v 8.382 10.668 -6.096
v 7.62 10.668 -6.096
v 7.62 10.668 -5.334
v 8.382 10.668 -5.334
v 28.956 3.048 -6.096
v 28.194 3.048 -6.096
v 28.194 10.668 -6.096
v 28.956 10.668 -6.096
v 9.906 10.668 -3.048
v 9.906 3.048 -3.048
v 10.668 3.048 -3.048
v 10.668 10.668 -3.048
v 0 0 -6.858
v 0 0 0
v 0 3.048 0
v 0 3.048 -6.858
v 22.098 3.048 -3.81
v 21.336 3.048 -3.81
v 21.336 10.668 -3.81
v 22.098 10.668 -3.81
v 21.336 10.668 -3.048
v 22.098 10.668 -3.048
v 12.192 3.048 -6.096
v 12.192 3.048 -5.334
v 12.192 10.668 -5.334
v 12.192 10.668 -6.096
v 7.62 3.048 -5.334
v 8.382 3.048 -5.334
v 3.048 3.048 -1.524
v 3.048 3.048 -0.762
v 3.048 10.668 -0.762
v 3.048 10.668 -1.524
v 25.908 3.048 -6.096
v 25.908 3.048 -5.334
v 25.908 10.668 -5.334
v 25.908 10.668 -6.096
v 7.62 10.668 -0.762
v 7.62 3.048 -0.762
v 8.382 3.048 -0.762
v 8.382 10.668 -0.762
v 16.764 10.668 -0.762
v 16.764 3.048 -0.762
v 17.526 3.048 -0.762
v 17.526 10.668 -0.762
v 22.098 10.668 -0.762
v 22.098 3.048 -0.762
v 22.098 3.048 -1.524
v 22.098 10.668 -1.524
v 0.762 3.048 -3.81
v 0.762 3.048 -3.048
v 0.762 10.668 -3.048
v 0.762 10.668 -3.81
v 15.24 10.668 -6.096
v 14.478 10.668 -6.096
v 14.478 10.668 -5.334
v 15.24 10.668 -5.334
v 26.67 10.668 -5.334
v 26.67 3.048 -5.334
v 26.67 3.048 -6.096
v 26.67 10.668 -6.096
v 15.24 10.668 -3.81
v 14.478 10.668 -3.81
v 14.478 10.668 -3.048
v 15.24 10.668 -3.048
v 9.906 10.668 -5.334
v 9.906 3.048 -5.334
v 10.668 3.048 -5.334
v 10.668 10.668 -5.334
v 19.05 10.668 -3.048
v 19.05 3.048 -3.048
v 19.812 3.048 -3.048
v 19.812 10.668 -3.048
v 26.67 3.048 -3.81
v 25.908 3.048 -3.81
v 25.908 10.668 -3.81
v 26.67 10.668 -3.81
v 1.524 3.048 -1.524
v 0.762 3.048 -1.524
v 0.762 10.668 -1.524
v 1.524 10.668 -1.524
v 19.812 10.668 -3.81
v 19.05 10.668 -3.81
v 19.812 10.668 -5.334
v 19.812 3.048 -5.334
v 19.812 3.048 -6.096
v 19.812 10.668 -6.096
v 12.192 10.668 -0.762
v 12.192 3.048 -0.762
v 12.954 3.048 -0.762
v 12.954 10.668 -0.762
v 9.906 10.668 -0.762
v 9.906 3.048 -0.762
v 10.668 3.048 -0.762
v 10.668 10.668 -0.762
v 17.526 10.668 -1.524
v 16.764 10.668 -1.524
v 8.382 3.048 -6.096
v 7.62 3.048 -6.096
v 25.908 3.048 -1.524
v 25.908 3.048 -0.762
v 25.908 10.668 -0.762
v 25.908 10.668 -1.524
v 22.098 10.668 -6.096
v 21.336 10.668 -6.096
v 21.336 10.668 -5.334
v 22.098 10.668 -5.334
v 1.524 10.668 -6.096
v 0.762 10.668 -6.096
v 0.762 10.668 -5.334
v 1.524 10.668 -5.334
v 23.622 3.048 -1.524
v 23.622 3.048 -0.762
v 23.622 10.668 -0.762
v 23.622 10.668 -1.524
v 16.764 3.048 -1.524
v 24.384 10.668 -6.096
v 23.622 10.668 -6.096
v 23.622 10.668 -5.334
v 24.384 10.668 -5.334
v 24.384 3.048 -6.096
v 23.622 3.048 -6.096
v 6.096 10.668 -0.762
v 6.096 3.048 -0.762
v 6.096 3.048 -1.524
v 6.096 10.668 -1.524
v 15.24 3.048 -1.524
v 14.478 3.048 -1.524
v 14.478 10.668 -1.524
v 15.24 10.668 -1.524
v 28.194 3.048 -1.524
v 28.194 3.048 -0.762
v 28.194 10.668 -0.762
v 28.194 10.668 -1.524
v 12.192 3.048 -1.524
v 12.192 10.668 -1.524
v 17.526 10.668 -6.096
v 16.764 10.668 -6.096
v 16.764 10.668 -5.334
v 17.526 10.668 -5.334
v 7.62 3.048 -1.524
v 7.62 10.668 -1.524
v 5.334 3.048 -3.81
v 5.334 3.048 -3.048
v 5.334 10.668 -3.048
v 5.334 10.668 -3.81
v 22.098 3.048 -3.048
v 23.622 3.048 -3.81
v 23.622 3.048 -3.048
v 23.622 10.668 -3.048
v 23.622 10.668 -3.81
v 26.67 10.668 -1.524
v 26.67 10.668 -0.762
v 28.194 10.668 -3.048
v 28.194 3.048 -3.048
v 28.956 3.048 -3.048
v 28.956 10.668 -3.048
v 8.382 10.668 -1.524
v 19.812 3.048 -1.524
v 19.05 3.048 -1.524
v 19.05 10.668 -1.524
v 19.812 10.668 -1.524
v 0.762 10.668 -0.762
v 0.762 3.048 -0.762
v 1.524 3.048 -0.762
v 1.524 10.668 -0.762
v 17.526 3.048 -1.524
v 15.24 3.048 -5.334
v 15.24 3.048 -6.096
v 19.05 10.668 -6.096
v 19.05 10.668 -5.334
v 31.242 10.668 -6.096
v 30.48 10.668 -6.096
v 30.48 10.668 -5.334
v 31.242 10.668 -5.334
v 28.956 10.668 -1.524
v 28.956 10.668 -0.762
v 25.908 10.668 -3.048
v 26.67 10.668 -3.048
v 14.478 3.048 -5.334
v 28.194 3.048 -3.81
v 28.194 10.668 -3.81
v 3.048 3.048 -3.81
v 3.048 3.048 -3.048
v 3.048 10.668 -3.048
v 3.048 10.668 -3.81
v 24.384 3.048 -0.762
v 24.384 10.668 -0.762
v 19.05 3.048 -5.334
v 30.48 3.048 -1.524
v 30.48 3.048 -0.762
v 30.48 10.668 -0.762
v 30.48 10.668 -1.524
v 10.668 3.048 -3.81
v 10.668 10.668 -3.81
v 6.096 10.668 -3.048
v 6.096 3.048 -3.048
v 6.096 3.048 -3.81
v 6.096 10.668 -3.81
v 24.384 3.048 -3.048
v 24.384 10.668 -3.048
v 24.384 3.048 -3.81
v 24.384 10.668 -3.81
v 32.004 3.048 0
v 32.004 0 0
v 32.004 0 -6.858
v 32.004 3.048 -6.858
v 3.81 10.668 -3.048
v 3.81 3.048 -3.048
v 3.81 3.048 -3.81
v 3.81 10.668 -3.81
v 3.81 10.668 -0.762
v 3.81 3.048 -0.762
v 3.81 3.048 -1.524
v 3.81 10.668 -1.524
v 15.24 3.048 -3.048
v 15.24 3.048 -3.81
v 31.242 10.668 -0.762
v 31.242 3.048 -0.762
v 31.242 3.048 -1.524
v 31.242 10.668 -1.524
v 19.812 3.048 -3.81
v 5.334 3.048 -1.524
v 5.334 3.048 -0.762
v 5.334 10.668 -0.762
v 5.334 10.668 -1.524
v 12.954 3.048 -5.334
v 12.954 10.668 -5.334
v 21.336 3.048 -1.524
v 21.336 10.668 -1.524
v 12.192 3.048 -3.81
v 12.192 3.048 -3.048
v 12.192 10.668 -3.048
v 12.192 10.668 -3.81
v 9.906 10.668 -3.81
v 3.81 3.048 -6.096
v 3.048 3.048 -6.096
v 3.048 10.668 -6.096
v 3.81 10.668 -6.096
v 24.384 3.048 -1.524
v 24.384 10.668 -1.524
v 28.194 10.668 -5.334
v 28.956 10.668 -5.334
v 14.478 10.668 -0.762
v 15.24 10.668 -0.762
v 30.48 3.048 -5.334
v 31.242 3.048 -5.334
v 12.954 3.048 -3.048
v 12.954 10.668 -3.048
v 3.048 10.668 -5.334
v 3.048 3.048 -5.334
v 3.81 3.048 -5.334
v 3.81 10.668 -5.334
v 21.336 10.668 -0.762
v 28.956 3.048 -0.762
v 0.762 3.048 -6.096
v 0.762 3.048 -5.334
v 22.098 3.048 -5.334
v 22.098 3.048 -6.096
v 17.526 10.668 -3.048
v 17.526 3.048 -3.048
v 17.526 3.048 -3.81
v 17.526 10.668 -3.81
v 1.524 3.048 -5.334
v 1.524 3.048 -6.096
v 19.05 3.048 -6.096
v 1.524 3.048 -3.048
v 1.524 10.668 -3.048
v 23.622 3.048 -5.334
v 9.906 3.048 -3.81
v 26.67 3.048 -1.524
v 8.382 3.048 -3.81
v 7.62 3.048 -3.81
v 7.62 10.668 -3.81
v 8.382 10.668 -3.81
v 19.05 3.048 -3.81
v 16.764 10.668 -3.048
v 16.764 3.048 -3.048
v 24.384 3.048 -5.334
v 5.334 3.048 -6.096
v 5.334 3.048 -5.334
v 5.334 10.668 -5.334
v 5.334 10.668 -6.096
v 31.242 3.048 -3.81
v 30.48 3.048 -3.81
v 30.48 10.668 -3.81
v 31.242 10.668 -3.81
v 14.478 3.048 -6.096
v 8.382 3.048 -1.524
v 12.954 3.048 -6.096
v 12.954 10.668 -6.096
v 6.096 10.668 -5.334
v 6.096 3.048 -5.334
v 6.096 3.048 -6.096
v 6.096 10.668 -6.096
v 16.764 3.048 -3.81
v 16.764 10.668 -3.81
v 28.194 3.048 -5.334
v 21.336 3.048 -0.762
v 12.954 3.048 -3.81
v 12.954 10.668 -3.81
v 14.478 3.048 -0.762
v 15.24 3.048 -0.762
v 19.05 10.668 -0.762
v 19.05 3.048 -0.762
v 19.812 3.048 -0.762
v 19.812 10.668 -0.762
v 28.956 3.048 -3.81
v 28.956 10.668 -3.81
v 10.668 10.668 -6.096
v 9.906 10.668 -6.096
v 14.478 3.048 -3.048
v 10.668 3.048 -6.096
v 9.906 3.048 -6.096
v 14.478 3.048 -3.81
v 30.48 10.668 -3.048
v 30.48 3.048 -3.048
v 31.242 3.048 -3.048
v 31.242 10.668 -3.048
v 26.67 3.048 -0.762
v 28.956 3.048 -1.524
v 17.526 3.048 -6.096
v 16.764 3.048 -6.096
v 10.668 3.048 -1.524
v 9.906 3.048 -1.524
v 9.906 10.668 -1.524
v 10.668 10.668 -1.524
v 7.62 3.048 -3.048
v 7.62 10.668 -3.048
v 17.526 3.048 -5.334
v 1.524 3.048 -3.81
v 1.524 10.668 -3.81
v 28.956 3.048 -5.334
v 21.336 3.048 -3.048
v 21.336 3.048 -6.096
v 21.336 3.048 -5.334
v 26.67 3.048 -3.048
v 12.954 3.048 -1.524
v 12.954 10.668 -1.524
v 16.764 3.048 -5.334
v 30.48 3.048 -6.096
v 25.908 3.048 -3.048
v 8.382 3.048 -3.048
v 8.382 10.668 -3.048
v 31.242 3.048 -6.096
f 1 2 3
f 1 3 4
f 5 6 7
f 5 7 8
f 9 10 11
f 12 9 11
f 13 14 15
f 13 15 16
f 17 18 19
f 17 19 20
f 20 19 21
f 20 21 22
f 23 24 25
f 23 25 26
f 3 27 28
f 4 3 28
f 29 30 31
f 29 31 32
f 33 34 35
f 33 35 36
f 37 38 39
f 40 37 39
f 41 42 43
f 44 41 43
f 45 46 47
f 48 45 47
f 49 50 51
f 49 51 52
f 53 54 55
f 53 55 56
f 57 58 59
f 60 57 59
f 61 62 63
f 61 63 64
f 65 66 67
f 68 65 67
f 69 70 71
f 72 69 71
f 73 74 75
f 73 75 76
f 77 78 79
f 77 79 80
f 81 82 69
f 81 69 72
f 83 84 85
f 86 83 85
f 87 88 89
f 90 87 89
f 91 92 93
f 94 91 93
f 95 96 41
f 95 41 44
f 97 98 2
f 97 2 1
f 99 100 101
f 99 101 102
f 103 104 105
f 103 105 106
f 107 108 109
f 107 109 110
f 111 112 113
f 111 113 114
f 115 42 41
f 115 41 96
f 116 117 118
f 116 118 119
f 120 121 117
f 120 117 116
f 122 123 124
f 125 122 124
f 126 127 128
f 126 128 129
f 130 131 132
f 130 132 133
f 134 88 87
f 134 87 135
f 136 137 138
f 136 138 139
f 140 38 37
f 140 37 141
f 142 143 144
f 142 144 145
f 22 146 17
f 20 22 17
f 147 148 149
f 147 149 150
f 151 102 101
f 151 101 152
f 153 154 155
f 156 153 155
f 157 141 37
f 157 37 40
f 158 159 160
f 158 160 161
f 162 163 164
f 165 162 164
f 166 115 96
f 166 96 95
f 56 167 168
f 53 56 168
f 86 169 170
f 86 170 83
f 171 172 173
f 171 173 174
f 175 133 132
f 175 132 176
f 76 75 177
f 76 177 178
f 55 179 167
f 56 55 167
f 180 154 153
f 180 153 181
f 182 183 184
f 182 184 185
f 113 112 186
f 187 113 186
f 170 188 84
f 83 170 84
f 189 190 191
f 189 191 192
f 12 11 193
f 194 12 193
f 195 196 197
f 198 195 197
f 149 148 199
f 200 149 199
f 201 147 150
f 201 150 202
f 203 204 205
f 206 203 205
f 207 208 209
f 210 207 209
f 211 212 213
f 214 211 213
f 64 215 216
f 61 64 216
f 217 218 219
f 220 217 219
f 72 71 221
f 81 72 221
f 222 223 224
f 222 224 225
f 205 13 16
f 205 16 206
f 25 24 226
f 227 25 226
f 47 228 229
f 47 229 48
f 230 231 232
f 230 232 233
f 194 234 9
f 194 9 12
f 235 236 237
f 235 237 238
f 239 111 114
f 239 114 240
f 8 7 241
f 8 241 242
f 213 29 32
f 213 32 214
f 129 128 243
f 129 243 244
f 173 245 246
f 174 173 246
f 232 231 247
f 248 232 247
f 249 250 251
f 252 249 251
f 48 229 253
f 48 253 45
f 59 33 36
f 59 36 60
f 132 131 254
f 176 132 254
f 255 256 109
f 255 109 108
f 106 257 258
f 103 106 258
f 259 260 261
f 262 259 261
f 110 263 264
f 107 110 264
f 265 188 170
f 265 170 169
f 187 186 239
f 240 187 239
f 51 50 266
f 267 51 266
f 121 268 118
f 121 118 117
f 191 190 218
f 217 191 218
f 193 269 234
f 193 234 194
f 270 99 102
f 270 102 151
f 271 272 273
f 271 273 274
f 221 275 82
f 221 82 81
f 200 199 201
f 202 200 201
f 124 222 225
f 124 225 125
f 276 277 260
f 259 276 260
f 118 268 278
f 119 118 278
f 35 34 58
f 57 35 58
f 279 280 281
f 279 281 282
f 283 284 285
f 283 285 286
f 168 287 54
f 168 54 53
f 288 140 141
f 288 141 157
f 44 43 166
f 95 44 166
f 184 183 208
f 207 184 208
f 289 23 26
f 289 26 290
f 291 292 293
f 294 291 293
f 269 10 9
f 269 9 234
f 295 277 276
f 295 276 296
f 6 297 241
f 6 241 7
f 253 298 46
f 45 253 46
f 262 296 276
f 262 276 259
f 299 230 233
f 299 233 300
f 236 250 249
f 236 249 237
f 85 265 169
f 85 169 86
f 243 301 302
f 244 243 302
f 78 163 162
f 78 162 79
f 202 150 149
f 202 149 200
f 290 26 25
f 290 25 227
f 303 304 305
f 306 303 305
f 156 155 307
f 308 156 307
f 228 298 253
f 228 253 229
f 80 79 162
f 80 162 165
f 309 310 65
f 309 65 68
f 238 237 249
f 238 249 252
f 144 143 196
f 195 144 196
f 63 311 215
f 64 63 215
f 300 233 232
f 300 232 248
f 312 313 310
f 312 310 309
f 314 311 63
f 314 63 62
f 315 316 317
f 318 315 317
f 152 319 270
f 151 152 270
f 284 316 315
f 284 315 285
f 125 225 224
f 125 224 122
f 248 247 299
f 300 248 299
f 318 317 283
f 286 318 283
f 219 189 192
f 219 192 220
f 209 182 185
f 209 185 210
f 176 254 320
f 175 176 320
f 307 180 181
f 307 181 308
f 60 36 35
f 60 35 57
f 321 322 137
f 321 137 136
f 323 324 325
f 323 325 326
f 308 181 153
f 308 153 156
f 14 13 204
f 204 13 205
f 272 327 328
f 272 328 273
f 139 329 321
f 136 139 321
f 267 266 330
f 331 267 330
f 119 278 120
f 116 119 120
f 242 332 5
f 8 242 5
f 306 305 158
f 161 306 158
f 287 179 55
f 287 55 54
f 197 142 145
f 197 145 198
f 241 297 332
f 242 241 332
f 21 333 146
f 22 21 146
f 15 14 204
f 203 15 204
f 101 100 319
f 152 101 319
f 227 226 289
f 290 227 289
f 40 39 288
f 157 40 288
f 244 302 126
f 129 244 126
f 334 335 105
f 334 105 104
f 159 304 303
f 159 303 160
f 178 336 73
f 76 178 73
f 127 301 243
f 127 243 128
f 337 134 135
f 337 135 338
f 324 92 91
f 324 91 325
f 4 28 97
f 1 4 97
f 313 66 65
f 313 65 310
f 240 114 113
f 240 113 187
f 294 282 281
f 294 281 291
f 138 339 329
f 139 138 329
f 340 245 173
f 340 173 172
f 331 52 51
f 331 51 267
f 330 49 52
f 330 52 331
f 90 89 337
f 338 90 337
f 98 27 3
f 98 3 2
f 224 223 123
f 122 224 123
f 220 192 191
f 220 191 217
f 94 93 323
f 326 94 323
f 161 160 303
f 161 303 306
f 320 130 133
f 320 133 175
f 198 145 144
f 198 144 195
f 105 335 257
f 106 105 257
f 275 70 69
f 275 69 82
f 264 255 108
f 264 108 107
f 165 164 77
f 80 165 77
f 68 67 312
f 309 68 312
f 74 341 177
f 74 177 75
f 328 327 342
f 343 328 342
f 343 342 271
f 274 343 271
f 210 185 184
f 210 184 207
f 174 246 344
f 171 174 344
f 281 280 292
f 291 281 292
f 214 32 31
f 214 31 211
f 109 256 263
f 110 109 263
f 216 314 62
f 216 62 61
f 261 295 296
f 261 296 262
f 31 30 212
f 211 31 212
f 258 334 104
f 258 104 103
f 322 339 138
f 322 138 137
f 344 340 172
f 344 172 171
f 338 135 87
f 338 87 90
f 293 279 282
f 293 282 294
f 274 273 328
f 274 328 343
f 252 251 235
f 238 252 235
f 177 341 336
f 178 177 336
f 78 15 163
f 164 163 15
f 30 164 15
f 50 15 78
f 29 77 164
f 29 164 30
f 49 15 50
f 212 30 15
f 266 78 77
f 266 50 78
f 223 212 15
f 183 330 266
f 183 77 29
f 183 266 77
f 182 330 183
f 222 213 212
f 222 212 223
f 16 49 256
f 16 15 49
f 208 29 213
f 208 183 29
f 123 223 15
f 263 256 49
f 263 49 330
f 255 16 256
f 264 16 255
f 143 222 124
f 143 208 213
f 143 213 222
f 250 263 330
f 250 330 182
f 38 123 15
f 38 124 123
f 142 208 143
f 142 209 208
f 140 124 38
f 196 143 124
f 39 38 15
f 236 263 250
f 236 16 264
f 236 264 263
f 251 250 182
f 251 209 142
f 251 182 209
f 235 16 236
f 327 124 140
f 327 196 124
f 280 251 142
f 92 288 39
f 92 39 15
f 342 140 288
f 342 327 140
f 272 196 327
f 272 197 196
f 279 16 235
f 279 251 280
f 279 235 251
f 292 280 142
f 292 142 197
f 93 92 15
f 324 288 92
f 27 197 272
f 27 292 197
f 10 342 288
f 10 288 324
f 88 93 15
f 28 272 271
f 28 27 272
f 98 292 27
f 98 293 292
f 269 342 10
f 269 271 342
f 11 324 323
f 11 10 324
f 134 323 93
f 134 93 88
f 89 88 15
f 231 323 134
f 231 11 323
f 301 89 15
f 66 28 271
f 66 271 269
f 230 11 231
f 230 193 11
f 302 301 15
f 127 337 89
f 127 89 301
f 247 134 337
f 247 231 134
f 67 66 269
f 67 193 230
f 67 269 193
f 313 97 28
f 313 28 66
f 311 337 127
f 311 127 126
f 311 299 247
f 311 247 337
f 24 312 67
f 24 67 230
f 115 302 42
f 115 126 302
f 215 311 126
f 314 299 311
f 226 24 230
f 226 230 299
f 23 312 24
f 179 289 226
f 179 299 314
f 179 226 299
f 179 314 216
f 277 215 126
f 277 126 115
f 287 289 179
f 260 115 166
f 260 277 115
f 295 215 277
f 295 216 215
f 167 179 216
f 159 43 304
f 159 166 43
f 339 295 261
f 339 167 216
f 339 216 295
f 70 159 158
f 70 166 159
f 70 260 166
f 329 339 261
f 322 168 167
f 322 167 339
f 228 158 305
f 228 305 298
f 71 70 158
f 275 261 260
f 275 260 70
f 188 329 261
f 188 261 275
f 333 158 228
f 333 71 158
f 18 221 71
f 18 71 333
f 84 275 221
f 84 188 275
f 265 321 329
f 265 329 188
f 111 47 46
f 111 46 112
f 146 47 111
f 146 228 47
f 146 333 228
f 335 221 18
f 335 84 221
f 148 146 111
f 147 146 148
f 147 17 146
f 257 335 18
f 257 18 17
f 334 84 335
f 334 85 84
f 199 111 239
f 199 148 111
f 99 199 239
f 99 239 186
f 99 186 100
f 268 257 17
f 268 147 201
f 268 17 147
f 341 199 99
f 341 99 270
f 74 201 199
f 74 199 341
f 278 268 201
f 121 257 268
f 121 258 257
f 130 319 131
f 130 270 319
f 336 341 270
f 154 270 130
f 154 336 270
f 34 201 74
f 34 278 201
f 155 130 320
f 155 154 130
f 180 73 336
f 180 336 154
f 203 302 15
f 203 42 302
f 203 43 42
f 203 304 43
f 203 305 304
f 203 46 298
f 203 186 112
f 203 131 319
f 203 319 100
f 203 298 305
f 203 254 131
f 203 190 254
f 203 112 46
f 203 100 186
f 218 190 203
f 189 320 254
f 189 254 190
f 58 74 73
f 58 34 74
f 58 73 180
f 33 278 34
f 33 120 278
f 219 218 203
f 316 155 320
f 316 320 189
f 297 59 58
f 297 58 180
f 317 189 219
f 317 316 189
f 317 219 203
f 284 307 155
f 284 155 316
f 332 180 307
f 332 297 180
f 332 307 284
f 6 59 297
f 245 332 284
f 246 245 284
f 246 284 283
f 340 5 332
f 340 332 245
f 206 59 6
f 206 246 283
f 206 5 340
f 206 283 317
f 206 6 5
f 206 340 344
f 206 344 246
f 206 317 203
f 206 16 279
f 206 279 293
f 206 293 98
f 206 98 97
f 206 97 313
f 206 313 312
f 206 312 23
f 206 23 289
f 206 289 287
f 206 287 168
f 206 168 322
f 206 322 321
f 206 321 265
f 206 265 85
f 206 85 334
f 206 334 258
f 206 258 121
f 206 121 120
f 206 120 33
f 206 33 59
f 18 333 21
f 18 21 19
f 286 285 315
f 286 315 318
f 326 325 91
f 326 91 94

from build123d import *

# Parameters (mm, degrees)
SKETCH1_W      = 32.004
SKETCH1_H      = 6.858
EXTRUDE1_DEPTH = 3.048
SKETCH2_W      = 0.762
SKETCH2_H      = 0.762
EXTRUDE2_DEPTH = 7.62


with BuildPart() as part:
    # Sketch1 → Extrude1 (new body)
    with BuildSketch(Plane(origin=(0, 0, 0), x_dir=(1, 0, 0), z_dir=(0, 1, 0))):
        with Locations((16.002, 3.429)):
            Rectangle(SKETCH1_W, SKETCH1_H)
    extrude(amount=EXTRUDE1_DEPTH)

    # Sketch2 → Extrude2 (add)
    with BuildSketch(Plane(origin=(0, 3.048, 0), x_dir=(1, 0, 0), z_dir=(0, 1, 0))):
        with Locations((3.429, 5.715)):
            Rectangle(SKETCH2_W, SKETCH2_H)
        with Locations((1.143, 5.715)):
            Rectangle(SKETCH2_W, SKETCH2_H)
        with Locations((5.715, 5.715)):
            Rectangle(SKETCH2_W, SKETCH2_H)
        with Locations((8.001, 5.715)):
            Rectangle(SKETCH2_W, SKETCH2_H)
        with Locations((10.287, 5.715)):
            Rectangle(SKETCH2_W, SKETCH2_H)
        with Locations((12.573, 5.715)):
            Rectangle(SKETCH2_W, SKETCH2_H)
        with Locations((14.859, 5.715)):
            Rectangle(SKETCH2_W, SKETCH2_H)
        with Locations((17.145, 5.715)):
            Rectangle(SKETCH2_W, SKETCH2_H)
        with Locations((19.431, 5.715)):
            Rectangle(SKETCH2_W, SKETCH2_H)
        with Locations((21.717, 5.715)):
            Rectangle(SKETCH2_W, SKETCH2_H)
        with Locations((24.003, 5.715)):
            Rectangle(SKETCH2_W, SKETCH2_H)
        with Locations((26.289, 5.715)):
            Rectangle(SKETCH2_W, SKETCH2_H)
        with Locations((28.575, 5.715)):
            Rectangle(SKETCH2_W, SKETCH2_H)
        with Locations((30.861, 5.715)):
            Rectangle(SKETCH2_W, SKETCH2_H)
        with Locations((1.143, 3.429)):
            Rectangle(SKETCH2_W, SKETCH2_H)
        with Locations((3.429, 3.429)):
            Rectangle(SKETCH2_W, SKETCH2_H)
        with Locations((5.715, 3.429)):
            Rectangle(SKETCH2_W, SKETCH2_H)
        with Locations((8.001, 3.429)):
            Rectangle(SKETCH2_W, SKETCH2_H)
        with Locations((10.287, 3.429)):
            Rectangle(SKETCH2_W, SKETCH2_H)
        with Locations((12.573, 3.429)):
            Rectangle(SKETCH2_W, SKETCH2_H)
        with Locations((14.859, 3.429)):
            Rectangle(SKETCH2_W, SKETCH2_H)
        with Locations((17.145, 3.429)):
            Rectangle(SKETCH2_W, SKETCH2_H)
        with Locations((19.431, 3.429)):
            Rectangle(SKETCH2_W, SKETCH2_H)
        with Locations((21.717, 3.429)):
            Rectangle(SKETCH2_W, SKETCH2_H)
        with Locations((24.003, 3.429)):
            Rectangle(SKETCH2_W, SKETCH2_H)
        with Locations((26.289, 3.429)):
            Rectangle(SKETCH2_W, SKETCH2_H)
        with Locations((28.575, 3.429)):
            Rectangle(SKETCH2_W, SKETCH2_H)
        with Locations((30.861, 3.429)):
            Rectangle(SKETCH2_W, SKETCH2_H)
        with Locations((1.143, 1.143)):
            Rectangle(SKETCH2_W, SKETCH2_H)
        with Locations((3.429, 1.143)):
            Rectangle(SKETCH2_W, SKETCH2_H)
        with Locations((5.715, 1.143)):
            Rectangle(SKETCH2_W, SKETCH2_H)
        with Locations((8.001, 1.143)):
            Rectangle(SKETCH2_W, SKETCH2_H)
        with Locations((10.287, 1.143)):
            Rectangle(SKETCH2_W, SKETCH2_H)
        with Locations((12.573, 1.143)):
            Rectangle(SKETCH2_W, SKETCH2_H)
        with Locations((14.859, 1.143)):
            Rectangle(SKETCH2_W, SKETCH2_H)
        with Locations((17.145, 1.143)):
            Rectangle(SKETCH2_W, SKETCH2_H)
        with Locations((19.431, 1.143)):
            Rectangle(SKETCH2_W, SKETCH2_H)
        with Locations((21.717, 1.143)):
            Rectangle(SKETCH2_W, SKETCH2_H)
        with Locations((24.003, 1.143)):
            Rectangle(SKETCH2_W, SKETCH2_H)
        with Locations((26.289, 1.143)):
            Rectangle(SKETCH2_W, SKETCH2_H)
        with Locations((28.575, 1.143)):
            Rectangle(SKETCH2_W, SKETCH2_H)
        with Locations((30.861, 1.143)):
            Rectangle(SKETCH2_W, SKETCH2_H)
    extrude(amount=EXTRUDE2_DEPTH)


solid = part.part
